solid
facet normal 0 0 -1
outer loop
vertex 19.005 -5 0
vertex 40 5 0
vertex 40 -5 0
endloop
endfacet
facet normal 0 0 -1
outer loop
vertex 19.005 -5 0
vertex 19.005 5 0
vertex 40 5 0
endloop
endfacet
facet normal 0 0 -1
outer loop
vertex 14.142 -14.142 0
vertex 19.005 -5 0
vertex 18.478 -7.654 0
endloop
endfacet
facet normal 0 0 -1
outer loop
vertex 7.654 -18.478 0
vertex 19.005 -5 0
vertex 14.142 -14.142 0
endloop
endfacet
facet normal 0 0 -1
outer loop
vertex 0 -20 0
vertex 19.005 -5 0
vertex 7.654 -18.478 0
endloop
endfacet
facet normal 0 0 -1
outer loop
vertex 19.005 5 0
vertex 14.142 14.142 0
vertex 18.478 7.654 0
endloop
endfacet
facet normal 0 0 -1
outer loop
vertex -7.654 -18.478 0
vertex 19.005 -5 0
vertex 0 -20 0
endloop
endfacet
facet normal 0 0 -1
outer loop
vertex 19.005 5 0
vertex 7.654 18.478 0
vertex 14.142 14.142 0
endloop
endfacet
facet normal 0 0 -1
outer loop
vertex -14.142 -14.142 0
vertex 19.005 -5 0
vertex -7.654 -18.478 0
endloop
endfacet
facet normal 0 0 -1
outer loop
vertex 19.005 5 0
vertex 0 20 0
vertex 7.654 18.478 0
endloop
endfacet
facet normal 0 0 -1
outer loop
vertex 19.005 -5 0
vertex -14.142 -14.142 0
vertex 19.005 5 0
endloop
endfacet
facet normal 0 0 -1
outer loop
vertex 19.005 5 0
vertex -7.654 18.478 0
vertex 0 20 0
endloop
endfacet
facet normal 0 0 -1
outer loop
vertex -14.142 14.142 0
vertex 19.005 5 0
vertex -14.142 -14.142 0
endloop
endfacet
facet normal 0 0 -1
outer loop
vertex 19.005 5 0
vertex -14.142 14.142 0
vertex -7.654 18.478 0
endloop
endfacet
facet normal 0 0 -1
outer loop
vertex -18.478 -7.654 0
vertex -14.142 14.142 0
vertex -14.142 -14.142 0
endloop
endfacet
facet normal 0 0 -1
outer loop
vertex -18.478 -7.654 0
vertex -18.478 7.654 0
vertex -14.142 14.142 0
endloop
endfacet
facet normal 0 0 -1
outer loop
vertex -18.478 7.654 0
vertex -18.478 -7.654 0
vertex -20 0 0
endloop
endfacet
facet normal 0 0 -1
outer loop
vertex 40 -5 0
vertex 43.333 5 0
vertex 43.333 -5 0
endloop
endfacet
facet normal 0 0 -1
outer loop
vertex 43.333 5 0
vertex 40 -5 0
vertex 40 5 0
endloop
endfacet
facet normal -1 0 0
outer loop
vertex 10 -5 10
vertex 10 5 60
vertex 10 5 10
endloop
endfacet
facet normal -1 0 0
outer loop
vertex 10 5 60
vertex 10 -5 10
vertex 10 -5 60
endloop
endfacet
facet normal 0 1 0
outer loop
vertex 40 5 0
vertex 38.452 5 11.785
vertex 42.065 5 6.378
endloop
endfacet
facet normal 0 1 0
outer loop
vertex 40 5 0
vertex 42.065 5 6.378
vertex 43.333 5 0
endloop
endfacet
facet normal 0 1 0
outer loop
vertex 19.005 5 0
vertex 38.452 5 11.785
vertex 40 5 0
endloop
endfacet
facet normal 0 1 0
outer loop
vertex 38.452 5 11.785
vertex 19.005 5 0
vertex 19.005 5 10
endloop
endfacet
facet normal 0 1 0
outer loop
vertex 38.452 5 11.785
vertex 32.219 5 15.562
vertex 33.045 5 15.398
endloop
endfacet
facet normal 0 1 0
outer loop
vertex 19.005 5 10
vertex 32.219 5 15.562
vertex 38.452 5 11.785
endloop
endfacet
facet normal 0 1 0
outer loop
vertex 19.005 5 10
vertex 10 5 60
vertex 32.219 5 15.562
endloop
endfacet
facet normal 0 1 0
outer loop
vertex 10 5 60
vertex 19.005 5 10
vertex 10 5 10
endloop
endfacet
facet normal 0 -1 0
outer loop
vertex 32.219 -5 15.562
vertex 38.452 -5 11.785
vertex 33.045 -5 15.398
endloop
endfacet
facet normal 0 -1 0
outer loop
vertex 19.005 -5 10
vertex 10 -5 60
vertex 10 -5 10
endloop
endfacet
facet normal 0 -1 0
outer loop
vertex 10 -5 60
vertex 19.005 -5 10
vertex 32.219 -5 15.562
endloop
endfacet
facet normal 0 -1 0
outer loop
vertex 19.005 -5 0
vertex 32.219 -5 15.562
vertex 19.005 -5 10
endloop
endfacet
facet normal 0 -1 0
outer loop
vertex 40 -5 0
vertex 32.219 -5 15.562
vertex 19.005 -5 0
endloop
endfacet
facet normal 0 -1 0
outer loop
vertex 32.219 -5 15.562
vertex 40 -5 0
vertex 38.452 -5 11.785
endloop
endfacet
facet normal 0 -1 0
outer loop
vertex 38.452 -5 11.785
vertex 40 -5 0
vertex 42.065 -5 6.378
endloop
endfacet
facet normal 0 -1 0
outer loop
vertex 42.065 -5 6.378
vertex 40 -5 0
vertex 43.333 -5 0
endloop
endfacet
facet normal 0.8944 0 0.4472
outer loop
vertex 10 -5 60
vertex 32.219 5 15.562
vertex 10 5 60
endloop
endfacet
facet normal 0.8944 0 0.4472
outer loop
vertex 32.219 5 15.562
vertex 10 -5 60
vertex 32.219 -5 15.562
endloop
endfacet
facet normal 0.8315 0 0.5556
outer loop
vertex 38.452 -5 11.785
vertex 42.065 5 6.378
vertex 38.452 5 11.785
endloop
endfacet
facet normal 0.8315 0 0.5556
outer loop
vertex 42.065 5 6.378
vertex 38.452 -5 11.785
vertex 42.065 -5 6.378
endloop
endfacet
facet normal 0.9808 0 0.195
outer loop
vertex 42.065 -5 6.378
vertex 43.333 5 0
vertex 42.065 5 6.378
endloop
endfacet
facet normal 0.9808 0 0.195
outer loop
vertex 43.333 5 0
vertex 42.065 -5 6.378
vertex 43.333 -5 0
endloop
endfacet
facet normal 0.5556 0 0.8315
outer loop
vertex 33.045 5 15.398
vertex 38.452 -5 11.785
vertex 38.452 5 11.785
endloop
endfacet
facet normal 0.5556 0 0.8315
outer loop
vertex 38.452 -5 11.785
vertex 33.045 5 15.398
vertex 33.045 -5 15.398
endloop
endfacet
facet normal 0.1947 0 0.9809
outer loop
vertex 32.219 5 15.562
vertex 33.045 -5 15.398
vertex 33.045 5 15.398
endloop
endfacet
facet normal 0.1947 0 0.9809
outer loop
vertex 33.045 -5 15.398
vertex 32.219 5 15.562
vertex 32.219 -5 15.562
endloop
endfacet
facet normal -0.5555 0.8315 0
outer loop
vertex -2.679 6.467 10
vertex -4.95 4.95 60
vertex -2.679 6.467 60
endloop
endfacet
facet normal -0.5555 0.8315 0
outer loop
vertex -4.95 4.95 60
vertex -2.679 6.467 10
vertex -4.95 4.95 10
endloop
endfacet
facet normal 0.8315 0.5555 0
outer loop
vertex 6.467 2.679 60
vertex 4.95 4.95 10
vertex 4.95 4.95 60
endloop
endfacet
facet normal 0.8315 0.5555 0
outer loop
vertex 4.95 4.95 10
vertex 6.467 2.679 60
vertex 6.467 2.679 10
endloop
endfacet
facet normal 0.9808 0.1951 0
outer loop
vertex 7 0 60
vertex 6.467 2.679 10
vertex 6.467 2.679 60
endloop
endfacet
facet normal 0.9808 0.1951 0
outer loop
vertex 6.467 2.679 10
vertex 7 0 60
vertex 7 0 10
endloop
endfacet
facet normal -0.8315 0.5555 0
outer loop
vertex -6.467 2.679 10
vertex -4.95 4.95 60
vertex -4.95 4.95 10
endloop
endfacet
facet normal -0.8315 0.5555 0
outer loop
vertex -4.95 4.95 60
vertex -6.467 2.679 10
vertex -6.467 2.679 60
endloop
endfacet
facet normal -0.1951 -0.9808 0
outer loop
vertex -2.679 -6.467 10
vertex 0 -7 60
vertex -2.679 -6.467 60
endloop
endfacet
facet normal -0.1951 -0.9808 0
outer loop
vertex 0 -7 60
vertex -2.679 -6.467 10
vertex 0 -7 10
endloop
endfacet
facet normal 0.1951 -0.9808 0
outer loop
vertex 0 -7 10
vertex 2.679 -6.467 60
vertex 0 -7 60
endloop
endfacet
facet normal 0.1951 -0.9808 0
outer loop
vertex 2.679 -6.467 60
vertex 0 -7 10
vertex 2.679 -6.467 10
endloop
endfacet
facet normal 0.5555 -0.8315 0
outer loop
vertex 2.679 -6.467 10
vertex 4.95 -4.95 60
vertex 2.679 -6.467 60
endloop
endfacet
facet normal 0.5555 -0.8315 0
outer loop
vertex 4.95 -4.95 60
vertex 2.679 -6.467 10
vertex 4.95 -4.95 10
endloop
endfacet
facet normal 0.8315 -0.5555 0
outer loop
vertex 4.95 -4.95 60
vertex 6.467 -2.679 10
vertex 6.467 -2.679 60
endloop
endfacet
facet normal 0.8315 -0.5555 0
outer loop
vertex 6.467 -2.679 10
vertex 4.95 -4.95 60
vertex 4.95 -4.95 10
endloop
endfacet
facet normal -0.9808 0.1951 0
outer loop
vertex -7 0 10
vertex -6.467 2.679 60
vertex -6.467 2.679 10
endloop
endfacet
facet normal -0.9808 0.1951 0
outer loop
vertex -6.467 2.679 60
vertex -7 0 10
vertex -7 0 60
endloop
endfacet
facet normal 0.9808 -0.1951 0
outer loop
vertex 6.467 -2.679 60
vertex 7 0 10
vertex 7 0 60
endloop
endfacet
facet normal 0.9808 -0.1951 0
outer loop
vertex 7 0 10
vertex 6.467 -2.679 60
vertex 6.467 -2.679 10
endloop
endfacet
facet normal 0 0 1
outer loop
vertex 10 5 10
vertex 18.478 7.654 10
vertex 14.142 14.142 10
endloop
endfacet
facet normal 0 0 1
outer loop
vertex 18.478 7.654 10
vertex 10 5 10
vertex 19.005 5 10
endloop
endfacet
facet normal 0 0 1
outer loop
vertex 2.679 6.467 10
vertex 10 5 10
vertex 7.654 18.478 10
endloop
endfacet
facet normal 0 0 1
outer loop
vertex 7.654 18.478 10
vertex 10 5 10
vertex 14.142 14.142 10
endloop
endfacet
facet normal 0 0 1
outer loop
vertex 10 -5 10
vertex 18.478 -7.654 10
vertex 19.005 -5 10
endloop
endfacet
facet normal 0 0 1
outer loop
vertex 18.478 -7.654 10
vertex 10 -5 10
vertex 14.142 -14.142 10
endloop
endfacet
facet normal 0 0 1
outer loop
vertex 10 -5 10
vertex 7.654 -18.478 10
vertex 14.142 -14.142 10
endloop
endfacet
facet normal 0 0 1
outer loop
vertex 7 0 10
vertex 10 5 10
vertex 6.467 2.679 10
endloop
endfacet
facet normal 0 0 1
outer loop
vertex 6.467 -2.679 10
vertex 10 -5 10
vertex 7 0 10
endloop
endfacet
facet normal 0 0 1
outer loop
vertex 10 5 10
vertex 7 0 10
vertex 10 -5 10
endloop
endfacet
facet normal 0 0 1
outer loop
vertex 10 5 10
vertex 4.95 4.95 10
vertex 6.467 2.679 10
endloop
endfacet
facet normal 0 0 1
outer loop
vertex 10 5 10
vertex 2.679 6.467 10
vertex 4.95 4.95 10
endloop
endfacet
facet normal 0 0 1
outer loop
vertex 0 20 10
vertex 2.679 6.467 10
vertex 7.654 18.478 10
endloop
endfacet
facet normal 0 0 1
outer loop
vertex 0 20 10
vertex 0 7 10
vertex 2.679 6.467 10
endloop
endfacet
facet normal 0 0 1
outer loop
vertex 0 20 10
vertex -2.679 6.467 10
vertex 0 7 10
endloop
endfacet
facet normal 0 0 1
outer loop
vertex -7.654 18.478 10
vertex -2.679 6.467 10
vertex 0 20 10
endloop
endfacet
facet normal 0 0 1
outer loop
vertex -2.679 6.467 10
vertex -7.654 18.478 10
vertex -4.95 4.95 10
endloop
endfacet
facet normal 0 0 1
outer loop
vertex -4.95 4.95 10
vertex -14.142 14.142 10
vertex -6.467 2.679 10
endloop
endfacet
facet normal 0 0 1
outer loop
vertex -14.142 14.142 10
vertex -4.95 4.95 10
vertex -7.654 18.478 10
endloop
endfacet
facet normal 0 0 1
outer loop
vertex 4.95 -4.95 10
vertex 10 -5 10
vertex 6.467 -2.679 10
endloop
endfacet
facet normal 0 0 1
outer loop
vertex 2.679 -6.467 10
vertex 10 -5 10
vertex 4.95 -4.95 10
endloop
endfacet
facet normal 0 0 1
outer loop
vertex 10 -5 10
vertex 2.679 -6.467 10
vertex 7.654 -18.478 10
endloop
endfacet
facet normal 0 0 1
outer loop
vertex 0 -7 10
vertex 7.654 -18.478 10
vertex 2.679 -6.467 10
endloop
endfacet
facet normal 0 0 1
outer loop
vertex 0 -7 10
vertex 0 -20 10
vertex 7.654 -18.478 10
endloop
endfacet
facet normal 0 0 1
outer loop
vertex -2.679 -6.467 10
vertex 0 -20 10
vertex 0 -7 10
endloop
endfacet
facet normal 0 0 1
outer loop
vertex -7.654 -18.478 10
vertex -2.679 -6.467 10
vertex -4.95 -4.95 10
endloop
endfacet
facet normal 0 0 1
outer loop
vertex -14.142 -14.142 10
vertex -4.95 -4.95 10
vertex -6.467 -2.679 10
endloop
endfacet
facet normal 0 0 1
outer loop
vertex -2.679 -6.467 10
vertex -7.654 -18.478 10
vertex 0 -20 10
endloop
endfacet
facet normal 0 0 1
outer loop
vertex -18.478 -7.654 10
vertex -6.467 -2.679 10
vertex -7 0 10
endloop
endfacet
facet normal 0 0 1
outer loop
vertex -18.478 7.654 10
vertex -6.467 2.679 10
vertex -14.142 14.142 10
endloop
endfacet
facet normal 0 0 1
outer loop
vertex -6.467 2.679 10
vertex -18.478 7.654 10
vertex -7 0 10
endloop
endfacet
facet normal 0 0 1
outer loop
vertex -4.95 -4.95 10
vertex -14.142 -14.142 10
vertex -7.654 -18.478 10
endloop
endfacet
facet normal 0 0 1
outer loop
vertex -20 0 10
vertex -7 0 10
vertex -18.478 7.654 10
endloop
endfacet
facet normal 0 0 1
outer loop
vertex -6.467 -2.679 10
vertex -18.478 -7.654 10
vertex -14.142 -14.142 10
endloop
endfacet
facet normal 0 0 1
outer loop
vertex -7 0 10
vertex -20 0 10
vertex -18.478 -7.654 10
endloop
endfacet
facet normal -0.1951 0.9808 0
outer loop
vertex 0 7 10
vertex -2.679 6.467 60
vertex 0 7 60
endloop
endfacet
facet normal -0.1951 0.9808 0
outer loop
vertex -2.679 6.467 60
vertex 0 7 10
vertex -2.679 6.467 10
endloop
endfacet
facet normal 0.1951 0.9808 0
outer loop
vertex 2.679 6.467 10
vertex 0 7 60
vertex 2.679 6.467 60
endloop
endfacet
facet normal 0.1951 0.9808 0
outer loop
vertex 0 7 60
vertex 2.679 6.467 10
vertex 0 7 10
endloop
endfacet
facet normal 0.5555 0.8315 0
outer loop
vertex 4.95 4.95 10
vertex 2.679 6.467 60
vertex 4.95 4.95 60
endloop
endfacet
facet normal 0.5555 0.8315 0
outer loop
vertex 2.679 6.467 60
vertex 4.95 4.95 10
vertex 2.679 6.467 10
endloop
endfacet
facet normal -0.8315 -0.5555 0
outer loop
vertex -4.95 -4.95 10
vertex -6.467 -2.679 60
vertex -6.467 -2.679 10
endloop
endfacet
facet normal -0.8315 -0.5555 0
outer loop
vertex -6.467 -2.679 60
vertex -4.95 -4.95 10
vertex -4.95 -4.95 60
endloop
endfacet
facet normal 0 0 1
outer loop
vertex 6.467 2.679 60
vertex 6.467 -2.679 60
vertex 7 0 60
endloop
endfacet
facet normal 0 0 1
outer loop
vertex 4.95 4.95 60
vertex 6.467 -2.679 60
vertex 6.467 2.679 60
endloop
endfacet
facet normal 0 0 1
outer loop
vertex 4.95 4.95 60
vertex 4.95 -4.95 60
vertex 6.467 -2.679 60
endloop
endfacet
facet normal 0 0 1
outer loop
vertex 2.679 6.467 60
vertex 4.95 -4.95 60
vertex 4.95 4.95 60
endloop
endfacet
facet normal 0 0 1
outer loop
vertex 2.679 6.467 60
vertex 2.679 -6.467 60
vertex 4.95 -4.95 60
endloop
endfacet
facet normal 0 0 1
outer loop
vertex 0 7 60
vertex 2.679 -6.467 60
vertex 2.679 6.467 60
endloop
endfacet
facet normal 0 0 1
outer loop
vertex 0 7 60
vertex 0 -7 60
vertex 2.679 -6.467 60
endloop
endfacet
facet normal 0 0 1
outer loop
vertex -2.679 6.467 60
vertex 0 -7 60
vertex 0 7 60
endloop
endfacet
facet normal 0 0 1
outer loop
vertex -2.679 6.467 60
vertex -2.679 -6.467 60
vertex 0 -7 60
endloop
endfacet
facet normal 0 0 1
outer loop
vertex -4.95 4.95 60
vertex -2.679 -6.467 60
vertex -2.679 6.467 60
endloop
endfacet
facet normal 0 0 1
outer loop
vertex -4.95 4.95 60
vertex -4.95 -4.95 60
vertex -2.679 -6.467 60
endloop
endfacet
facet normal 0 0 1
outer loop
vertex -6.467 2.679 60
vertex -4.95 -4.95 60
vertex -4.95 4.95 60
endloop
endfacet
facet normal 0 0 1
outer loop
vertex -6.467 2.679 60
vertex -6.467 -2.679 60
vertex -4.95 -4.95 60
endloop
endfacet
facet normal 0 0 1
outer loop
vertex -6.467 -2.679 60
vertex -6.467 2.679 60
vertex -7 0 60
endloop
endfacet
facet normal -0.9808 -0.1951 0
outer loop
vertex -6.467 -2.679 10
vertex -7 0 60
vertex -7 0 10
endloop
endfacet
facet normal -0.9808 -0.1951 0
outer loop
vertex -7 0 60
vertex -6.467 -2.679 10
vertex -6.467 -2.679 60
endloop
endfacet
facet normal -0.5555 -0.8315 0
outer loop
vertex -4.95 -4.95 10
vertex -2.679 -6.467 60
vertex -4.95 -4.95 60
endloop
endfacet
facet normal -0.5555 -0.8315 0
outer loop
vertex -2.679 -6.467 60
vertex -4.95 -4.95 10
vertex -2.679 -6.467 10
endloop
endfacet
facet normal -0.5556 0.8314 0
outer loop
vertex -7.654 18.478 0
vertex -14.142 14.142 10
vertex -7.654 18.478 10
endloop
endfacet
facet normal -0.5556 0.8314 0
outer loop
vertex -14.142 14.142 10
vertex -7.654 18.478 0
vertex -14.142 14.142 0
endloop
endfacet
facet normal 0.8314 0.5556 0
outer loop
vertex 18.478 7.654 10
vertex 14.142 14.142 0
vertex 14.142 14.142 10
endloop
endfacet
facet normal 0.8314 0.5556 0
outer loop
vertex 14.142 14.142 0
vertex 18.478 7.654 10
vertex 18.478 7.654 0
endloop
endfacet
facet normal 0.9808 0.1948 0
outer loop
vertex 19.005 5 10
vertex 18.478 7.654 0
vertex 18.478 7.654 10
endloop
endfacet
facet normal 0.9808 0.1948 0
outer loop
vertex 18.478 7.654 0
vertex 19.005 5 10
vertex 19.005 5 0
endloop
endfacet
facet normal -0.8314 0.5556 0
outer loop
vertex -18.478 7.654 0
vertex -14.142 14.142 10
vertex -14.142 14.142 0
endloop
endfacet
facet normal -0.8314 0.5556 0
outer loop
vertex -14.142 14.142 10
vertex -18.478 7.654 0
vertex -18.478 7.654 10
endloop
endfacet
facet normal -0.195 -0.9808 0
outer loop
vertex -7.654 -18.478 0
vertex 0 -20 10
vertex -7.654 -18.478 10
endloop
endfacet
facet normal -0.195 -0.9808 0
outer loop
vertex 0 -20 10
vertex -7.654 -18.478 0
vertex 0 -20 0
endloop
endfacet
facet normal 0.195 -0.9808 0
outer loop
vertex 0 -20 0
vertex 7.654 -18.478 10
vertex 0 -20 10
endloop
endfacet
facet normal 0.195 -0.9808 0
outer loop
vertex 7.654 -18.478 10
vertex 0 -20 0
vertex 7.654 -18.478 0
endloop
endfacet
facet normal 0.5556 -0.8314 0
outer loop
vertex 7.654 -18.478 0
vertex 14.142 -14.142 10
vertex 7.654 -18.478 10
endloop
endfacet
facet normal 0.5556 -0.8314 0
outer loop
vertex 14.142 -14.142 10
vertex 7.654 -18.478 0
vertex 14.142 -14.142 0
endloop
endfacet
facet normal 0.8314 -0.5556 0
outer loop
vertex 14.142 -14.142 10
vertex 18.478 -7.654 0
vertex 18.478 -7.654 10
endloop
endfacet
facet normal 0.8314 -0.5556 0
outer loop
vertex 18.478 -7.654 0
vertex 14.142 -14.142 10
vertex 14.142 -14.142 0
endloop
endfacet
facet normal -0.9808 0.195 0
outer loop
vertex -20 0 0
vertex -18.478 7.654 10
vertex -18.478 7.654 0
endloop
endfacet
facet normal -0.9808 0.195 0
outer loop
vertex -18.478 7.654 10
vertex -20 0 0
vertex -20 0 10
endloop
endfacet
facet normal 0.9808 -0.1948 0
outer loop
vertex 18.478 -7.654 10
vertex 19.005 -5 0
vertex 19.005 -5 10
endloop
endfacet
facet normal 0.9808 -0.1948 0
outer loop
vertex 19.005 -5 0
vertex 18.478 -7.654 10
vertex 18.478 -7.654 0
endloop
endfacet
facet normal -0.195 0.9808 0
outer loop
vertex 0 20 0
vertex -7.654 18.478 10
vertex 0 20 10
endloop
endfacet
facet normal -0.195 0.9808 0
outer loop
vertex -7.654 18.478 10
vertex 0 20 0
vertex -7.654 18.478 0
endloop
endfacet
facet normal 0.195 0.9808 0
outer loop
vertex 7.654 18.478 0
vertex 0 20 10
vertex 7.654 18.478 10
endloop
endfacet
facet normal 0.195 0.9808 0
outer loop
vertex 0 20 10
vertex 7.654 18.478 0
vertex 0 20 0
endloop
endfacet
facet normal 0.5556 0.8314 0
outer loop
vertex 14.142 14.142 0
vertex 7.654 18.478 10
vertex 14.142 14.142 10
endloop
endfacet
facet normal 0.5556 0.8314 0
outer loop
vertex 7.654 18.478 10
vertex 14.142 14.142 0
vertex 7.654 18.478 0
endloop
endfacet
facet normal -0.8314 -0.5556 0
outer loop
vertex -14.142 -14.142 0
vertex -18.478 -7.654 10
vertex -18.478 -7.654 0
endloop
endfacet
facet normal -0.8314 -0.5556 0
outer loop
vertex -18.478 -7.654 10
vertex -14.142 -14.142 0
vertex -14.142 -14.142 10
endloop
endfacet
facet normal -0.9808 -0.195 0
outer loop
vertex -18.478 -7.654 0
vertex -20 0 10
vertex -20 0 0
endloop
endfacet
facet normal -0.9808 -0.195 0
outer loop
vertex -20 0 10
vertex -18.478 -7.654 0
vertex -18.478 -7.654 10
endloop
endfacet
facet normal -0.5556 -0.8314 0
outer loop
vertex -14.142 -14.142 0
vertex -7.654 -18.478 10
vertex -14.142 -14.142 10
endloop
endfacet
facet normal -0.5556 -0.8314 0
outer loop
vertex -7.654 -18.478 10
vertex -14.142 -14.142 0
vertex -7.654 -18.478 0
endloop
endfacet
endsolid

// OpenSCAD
module coathook(height,depth,width,thickness,fn) {
    union() {
        translate([0,0,thickness]) { //Peg.
            cylinder(r=7,h=height,$fn=fn);
        }
        cylinder(r=10 + thickness,h=thickness,$fn=fn); //Base.
        translate([10,-width / 2,0]) { //Triangle.
            difference() {
                cube([depth,width,height + thickness]);
                translate([depth,0,0]) {
                    rotate([0,-atan(depth / (height + thickness)),0]) {
                        cube([depth + height + thickness,width,depth + height + thickness]);
                    }
                }
            }
        }
        difference() {
            translate([10 + thickness + (depth - thickness) / 3,width / 2,0]) {
                rotate([90,0,0]) {
                    cylinder(r=thickness + (depth - thickness) / 3,h=width,$fn=fn);
                }
            }
            translate([10,-width / 2,-depth]) {
                cube([depth + thickness,width,depth]);
            }
        }
    }
}

coathook(height=50,depth=30,width=10,thickness=10,fn=16);
